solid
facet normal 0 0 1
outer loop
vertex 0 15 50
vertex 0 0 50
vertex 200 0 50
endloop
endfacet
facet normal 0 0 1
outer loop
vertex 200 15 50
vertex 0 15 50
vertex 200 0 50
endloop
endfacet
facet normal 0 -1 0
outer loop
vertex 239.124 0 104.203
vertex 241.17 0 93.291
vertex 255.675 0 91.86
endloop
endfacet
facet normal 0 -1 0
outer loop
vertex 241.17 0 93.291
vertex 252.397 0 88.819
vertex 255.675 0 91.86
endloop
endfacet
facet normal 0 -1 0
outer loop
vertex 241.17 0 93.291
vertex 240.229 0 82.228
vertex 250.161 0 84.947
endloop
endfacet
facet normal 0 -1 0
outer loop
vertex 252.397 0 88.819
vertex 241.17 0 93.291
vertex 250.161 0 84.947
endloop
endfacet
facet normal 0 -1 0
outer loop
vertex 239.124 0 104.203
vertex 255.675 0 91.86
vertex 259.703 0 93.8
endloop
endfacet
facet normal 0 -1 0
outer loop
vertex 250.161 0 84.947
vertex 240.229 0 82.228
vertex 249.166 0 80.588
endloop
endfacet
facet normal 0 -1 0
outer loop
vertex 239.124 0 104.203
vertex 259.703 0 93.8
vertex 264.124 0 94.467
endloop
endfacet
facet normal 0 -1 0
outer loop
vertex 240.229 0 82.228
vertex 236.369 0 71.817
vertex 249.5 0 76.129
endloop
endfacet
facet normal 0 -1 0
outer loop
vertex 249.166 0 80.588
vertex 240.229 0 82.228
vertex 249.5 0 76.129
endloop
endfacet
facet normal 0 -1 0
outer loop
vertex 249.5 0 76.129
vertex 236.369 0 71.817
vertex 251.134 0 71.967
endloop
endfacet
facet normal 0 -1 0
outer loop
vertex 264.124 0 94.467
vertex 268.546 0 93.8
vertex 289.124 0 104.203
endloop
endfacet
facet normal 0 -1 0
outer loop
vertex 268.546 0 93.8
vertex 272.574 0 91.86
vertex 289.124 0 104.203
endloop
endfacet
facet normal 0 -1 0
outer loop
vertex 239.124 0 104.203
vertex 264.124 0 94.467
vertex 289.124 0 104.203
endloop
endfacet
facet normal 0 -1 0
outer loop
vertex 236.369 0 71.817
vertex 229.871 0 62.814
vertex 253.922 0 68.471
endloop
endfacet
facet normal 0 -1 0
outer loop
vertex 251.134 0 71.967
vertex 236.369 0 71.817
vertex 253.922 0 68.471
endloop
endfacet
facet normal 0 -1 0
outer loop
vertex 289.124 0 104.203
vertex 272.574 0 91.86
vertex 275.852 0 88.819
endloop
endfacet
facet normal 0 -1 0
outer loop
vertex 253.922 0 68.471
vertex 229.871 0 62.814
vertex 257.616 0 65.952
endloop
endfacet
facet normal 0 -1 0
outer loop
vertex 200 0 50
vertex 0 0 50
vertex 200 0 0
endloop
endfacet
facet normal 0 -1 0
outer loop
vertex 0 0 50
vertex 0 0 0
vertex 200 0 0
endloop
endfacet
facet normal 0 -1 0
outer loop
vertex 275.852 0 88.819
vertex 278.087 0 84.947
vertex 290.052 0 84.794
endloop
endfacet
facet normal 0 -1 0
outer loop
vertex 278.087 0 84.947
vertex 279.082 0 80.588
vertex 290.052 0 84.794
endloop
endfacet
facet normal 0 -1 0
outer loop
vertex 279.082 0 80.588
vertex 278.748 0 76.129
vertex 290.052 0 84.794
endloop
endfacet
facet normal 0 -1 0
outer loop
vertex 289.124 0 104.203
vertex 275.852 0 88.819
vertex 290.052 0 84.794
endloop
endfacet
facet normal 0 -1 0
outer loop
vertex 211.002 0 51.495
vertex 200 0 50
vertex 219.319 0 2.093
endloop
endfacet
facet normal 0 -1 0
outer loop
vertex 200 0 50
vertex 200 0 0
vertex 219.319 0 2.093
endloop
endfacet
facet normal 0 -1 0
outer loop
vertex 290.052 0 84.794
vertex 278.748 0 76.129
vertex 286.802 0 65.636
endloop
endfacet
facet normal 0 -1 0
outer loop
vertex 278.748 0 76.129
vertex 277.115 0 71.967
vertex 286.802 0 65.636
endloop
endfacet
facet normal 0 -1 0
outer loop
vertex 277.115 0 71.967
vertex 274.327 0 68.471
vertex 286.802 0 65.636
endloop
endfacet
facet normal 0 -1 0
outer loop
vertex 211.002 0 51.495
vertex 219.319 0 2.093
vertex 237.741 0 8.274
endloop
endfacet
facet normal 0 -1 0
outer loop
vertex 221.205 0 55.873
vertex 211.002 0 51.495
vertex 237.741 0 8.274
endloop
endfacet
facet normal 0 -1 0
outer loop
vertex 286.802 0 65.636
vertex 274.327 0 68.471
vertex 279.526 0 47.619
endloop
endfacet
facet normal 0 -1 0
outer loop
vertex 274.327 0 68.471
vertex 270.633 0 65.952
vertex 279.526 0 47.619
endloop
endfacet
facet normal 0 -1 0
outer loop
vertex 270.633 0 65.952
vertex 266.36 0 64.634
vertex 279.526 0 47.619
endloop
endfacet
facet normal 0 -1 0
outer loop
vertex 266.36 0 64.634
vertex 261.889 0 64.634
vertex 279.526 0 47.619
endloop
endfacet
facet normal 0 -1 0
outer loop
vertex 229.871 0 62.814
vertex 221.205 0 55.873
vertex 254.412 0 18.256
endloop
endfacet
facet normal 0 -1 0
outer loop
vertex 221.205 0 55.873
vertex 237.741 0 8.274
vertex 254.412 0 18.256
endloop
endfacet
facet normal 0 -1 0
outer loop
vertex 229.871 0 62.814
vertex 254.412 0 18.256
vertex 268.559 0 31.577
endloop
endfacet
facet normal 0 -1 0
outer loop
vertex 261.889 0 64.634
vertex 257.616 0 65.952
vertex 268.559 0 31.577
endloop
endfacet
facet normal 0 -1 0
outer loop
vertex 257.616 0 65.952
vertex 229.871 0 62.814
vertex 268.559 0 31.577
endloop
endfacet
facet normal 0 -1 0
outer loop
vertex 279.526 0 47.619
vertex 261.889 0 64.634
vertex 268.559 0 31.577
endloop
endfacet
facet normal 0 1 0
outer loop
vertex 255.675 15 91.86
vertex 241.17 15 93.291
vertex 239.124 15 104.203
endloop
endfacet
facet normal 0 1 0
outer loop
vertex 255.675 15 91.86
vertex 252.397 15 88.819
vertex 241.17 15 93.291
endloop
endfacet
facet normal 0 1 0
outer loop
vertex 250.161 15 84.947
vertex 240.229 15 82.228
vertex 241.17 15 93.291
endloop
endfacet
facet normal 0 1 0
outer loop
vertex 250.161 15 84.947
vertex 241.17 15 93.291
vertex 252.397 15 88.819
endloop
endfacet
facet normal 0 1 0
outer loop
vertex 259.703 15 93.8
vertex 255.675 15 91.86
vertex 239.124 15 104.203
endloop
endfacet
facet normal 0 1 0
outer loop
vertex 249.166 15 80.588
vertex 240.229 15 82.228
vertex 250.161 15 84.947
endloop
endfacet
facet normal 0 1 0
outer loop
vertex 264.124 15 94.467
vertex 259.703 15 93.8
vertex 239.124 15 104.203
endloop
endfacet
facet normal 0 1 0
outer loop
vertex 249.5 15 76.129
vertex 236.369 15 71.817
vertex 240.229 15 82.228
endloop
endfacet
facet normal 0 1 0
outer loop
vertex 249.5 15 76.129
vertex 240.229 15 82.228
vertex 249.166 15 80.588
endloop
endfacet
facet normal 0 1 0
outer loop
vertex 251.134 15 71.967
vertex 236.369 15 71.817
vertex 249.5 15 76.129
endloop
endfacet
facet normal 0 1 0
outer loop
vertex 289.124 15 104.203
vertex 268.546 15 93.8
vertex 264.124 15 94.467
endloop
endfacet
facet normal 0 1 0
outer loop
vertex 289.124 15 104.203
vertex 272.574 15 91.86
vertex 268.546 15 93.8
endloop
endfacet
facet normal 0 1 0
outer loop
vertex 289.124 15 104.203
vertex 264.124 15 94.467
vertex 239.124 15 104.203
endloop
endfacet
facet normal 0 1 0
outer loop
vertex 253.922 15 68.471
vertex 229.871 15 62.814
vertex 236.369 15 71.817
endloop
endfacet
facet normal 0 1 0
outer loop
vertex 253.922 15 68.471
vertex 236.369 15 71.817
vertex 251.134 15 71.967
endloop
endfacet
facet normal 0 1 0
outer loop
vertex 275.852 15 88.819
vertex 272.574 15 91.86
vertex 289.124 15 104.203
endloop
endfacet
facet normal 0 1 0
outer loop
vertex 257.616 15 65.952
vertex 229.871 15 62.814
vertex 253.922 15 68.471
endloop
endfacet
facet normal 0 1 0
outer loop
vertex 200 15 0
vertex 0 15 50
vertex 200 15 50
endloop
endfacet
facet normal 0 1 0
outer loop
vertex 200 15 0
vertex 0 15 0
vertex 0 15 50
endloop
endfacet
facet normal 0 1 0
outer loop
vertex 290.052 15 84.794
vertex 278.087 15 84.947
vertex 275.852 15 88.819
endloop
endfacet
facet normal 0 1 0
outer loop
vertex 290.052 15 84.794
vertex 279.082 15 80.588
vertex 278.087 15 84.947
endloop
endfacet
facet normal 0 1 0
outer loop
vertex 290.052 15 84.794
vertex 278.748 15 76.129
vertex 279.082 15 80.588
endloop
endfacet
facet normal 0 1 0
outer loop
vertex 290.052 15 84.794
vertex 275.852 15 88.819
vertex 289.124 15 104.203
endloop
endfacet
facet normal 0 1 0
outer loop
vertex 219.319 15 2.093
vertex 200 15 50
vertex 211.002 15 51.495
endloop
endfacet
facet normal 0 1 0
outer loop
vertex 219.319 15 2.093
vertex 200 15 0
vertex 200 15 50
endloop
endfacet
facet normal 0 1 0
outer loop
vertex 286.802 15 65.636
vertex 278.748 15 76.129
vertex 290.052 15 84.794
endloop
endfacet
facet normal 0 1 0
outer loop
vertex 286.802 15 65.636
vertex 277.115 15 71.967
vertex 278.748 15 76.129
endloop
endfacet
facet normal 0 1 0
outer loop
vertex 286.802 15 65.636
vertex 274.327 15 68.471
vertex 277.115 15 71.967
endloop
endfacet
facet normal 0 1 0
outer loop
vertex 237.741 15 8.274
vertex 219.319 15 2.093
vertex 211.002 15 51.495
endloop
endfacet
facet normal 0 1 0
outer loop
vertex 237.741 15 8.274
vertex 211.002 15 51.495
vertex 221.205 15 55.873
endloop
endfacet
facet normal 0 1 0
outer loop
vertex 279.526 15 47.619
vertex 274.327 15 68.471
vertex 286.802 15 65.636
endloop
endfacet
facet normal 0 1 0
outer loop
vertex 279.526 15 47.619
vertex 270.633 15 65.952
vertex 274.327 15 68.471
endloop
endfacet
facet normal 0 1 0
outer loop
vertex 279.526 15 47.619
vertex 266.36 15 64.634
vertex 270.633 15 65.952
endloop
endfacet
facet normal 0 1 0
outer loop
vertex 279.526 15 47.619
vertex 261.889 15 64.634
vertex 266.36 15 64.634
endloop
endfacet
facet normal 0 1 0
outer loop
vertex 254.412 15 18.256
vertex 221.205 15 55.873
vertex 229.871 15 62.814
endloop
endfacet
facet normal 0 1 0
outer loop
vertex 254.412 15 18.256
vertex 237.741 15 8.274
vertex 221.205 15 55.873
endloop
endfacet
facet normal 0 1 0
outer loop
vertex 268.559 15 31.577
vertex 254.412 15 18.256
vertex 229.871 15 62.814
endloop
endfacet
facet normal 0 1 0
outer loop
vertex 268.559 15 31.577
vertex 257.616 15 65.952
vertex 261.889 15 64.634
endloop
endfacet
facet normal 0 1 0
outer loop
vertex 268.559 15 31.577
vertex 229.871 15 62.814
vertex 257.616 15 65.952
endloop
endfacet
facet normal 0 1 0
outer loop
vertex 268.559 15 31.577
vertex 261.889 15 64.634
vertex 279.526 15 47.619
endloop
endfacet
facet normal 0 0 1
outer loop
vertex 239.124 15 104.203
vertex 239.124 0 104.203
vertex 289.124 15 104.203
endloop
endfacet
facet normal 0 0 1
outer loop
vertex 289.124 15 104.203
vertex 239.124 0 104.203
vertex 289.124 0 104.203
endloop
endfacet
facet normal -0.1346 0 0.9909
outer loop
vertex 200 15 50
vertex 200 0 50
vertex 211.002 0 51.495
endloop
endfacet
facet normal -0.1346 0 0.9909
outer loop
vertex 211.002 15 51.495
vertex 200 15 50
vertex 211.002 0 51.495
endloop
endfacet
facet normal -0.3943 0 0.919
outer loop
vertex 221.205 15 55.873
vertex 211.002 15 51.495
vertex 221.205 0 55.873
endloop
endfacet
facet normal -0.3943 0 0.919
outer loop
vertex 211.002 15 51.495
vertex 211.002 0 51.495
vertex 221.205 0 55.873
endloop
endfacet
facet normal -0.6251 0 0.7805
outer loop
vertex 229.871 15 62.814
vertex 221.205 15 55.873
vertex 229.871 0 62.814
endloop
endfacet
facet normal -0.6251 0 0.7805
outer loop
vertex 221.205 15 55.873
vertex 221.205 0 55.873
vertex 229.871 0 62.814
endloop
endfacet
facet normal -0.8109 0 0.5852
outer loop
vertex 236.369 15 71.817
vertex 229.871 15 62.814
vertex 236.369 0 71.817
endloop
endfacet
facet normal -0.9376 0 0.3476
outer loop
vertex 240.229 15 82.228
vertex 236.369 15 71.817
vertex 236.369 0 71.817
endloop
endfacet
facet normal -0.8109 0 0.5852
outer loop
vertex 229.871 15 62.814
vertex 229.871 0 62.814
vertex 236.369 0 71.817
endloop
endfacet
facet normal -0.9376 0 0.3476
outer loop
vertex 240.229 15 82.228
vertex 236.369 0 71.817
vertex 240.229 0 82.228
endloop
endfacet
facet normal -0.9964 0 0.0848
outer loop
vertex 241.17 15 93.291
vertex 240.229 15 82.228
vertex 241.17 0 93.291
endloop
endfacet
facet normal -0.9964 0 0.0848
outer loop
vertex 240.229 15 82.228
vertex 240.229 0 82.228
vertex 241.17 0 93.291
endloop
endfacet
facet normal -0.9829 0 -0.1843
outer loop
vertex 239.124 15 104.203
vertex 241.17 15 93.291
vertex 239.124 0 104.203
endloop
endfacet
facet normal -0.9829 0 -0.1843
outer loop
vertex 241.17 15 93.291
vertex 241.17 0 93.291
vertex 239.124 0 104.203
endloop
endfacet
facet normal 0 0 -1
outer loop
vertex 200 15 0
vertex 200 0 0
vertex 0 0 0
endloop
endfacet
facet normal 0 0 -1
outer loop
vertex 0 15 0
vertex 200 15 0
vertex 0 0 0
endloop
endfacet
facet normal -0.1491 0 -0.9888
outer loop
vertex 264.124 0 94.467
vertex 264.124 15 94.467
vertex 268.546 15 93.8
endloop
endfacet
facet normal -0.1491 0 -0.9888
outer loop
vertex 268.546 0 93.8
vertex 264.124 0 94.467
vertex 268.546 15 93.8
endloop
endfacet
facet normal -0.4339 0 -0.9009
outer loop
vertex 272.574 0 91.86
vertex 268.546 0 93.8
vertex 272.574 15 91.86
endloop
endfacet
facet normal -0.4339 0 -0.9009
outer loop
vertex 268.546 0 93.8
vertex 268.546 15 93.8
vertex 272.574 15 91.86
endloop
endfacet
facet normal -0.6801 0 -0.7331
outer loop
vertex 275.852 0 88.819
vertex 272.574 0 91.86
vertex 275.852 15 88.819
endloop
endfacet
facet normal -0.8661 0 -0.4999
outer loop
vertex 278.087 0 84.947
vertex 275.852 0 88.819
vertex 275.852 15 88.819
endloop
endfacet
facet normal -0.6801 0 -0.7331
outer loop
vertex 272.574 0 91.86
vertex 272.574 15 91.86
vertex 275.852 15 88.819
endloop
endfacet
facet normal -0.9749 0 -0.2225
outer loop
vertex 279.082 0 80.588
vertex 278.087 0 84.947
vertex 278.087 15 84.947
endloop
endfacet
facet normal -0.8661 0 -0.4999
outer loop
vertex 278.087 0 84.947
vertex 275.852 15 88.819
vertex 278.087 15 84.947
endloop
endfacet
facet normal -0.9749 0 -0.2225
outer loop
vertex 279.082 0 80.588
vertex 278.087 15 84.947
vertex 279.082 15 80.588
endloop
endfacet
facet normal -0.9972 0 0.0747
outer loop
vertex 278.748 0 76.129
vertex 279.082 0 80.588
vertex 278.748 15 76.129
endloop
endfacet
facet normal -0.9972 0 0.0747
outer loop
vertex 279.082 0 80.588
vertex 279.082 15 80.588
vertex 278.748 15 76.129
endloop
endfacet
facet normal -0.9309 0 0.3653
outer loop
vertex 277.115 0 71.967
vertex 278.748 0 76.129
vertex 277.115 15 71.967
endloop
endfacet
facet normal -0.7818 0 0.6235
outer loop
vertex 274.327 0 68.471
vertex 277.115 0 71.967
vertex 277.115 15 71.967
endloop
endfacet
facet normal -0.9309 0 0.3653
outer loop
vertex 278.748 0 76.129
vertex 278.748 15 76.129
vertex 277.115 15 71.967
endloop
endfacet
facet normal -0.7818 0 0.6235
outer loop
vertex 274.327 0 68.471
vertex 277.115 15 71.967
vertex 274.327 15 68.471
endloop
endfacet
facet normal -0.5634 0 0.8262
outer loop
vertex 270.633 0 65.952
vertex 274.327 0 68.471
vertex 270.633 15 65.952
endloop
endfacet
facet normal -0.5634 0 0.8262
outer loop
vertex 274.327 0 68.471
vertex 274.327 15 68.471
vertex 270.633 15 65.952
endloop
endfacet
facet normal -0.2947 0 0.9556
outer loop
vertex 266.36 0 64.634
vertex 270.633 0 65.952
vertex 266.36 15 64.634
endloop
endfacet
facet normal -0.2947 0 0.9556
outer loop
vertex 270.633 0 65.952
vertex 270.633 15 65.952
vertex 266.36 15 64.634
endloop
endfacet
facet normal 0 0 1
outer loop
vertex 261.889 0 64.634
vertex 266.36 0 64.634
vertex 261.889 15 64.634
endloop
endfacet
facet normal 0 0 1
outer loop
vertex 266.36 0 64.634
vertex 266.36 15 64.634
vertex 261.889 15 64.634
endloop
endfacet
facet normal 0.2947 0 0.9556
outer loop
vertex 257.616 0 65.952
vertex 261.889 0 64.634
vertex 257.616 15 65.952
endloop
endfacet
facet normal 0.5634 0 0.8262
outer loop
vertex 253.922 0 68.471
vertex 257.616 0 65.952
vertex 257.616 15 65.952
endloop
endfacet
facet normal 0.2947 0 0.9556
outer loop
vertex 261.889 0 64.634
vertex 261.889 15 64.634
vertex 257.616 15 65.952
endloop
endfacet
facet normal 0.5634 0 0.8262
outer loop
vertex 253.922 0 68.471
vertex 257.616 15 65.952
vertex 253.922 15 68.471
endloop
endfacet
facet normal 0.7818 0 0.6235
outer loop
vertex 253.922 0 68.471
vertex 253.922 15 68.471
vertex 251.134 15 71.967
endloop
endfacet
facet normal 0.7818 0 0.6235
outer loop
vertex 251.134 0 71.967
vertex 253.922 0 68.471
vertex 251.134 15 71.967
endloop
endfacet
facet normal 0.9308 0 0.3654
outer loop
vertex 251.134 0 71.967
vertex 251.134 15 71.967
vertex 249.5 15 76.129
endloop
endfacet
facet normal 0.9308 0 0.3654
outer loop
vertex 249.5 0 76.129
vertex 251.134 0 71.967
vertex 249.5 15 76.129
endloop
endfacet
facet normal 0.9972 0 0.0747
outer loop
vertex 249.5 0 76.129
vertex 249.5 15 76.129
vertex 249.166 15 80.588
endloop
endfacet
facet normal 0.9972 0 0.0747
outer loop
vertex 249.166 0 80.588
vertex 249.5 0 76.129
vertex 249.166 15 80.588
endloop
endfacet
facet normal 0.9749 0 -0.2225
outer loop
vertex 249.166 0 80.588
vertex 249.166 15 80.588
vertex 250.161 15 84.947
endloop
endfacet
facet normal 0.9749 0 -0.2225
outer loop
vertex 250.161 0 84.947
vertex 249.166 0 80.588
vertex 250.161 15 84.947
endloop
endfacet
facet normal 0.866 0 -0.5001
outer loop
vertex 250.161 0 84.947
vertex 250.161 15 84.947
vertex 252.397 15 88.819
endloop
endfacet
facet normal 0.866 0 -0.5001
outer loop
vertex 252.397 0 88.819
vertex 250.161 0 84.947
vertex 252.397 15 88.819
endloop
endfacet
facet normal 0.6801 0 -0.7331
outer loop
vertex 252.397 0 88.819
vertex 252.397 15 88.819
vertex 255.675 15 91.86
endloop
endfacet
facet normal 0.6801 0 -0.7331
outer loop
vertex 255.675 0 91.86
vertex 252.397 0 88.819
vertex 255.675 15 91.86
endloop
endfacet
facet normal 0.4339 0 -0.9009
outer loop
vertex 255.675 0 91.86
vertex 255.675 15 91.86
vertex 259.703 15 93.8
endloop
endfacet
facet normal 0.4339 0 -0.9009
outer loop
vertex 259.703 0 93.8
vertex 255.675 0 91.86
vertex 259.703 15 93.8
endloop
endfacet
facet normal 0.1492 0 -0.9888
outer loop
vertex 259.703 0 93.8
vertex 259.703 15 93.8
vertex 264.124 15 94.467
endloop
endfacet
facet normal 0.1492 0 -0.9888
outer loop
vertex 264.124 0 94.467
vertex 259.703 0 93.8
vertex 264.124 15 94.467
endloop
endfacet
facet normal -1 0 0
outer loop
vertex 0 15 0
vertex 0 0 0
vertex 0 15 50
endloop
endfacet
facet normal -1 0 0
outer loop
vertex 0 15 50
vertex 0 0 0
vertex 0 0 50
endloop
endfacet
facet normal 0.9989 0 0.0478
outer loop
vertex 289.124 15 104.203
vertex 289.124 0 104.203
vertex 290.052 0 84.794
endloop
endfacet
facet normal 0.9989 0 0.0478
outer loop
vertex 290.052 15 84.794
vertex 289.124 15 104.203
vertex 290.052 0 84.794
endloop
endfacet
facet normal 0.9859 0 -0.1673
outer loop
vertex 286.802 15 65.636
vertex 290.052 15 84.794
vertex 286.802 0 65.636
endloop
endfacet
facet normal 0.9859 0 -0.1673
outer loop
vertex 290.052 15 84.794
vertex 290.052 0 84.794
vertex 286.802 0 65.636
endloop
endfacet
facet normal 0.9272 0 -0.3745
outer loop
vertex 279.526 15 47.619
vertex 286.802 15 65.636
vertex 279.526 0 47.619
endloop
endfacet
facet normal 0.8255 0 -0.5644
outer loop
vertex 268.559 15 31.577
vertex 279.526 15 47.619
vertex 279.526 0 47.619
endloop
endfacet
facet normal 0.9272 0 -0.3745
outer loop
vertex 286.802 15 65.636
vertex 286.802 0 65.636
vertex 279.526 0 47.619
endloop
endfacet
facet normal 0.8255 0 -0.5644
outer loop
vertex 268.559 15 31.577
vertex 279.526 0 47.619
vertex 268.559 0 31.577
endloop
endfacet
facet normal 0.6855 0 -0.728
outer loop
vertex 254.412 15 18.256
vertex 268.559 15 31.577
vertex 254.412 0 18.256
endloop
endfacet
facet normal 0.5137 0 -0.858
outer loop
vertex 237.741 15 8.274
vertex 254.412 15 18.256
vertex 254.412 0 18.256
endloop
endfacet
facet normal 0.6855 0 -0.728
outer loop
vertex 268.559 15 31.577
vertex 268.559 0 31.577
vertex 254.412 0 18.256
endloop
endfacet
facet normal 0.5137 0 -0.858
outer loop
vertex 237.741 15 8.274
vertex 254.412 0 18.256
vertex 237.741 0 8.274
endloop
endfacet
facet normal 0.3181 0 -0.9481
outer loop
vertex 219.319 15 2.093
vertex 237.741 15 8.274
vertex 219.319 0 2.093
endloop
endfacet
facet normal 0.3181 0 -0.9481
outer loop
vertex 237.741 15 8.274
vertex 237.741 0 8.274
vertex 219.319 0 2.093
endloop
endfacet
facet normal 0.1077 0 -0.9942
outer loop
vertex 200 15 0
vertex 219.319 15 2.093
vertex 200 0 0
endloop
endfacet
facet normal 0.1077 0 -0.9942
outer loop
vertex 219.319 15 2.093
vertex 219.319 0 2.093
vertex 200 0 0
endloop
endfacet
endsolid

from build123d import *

# Parameters (mm, degrees)
BOSS_EXTRUDE1_DEPTH = 15
SKETCH5_R           = 15
CUT_EXTRUDE1_DEPTH  = 31


with BuildPart() as part:
    # Sketch4 → Boss-Extrude1 (new body)
    with BuildSketch(Plane(origin=(0, 0, 0), x_dir=(1, 0, 0), z_dir=(0, 1, 0))):
        with BuildLine():
            Line((0, -50), (200, -50))
            ThreePointArc((200, -50), (233.424270678, -67.095996649), (239.124306246, -104.203469835))
            Line((239.124306246, -104.203469835), (289.124306246, -104.203469835))
            ThreePointArc((289.124306246, -104.203469835), (268.559290197, -31.577195792), (200, 0))
            Line((200, 0), (0, 0))
            Line((0, 0), (0, -50))
        make_face()
    extrude(amount=BOSS_EXTRUDE1_DEPTH)

    # Sketch5 → Cut-Extrude1 (cut)
    with BuildSketch(Plane(origin=(0, 15, 0), x_dir=(1, 0, 0), z_dir=(0, 1, 0))):
        with Locations(Location((264.124306246, -79.466665475, 0), (0, 0, 270))):
            Circle(SKETCH5_R)
    extrude(amount=-CUT_EXTRUDE1_DEPTH, mode=Mode.SUBTRACT)


solid = part.part
